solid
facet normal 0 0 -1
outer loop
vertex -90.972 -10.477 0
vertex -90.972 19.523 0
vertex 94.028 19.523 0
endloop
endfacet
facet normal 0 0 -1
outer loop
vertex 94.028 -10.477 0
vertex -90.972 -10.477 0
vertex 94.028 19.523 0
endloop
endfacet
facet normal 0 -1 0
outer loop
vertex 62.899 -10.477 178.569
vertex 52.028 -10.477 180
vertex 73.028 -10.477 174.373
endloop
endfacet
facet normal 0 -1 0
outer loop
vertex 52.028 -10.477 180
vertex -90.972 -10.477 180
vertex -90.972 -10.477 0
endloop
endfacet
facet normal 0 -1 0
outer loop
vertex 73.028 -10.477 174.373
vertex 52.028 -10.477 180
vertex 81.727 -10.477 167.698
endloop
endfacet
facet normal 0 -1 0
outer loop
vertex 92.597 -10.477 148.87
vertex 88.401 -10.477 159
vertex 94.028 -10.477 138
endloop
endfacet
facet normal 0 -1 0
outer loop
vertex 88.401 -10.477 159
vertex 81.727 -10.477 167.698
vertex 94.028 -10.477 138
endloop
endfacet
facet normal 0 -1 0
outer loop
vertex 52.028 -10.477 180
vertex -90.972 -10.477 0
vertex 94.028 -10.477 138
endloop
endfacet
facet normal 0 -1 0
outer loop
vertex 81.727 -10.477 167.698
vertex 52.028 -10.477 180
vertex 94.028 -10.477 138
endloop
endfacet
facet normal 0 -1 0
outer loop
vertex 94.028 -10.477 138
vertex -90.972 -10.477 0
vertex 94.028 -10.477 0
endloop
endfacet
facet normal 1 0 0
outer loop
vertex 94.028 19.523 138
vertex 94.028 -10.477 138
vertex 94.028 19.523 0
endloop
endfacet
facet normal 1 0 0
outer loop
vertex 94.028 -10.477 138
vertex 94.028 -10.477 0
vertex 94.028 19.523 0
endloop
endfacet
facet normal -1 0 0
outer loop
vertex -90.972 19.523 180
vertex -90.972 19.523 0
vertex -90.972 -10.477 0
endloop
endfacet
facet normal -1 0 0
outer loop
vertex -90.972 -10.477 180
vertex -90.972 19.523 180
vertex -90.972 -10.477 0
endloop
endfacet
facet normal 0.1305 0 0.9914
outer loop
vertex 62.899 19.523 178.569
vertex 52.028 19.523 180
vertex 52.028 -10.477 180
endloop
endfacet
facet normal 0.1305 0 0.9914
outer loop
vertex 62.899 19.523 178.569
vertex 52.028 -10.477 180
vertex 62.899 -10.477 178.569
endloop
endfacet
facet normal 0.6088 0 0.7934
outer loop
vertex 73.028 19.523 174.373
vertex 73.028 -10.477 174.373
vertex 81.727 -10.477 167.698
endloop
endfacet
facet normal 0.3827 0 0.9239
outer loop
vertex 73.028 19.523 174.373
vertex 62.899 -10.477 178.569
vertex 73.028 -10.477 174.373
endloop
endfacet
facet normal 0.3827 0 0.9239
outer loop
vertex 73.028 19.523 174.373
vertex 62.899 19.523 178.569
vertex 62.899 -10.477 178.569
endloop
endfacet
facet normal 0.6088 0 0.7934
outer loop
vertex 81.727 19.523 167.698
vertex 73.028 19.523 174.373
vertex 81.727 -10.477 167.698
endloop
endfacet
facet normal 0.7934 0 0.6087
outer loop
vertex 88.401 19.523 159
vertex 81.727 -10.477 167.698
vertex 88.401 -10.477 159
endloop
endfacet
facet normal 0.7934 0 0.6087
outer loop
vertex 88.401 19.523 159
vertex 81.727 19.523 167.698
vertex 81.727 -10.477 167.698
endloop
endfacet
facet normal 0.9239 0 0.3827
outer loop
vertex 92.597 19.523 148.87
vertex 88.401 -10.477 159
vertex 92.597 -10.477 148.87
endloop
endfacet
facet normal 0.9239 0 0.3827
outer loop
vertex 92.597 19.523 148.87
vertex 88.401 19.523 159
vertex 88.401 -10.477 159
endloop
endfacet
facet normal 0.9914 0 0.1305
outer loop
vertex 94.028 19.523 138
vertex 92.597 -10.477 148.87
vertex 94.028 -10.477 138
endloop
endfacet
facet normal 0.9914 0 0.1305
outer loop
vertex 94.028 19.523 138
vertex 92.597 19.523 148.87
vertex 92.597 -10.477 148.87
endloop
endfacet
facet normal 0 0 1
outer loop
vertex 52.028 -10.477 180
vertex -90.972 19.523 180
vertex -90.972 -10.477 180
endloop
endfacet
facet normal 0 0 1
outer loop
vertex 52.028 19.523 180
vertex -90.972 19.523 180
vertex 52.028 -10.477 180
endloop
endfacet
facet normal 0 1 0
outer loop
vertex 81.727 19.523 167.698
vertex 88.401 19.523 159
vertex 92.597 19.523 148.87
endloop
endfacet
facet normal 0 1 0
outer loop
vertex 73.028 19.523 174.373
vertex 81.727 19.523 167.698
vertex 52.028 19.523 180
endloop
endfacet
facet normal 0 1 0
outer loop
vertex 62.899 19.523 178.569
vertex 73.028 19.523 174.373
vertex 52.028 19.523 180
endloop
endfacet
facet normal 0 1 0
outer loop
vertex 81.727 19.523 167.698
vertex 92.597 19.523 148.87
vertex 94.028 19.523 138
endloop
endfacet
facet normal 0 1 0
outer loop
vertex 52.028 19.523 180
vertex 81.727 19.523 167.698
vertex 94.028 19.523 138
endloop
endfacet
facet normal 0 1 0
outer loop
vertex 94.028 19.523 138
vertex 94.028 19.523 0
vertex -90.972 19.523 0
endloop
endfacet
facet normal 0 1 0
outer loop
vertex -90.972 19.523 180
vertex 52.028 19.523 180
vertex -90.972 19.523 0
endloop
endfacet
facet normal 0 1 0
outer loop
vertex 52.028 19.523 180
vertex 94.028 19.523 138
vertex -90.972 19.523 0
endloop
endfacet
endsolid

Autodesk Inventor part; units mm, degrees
ref_plane "YZ Plane" through (0, 0, 0) normal (1, 0, 0) x (0, 1, 0)
ref_plane "XZ Plane" through (0, 0, 0) normal (0, 1, 0) x (-1, 0, 0)
ref_plane "XY Plane" through (0, 0, 0) normal (0, 0, 1) x (1, 0, 0)
sketch "Эскиз1" plane through (0, 0, 0) normal (0, 0, 1) x (1, 0, 0)
  line L0 (-90.9717, -10.4774) -> (94.0283, -10.4774)
  line L1 (94.0283, -10.4774) -> (94.0283, 19.5226)
  line L2 (94.0283, 19.5226) -> (-90.9717, 19.5226)
  line L3 (-90.9717, 19.5226) -> (-90.9717, -10.4774)
  dimension "d2" = 185
  dimension "parametr_D" = 30
extrude "Выдавливание1" add sketch "Эскиз1" along normal blind 180
fillet "Сопряжение1" radius 42 1 edges at (94.0283, 4.5226, 180)
sketch "Эскиз3" plane through (-90.9717, -10.4774, 0) normal (0, -1, 0) x (1, 0, 0)
  point P0 (115, 21.3555)
sketch "Эскиз4" plane through (-90.9717, -10.4774, 0) normal (0, -1, 0) x (1, 0, 0)
  point P0 (15, 33)
equation "\"d2\" = parametr_A_"
equation "\"parametr_D\" = parametr_C_"
equation "\"d4\" = parametr_B_"
equation "\"parametr_A_\" = 185"
equation "\"parametr_C_\" = 30"
equation "\"parametr_B_\" = 180"
properties part number "lw_6_part2"
